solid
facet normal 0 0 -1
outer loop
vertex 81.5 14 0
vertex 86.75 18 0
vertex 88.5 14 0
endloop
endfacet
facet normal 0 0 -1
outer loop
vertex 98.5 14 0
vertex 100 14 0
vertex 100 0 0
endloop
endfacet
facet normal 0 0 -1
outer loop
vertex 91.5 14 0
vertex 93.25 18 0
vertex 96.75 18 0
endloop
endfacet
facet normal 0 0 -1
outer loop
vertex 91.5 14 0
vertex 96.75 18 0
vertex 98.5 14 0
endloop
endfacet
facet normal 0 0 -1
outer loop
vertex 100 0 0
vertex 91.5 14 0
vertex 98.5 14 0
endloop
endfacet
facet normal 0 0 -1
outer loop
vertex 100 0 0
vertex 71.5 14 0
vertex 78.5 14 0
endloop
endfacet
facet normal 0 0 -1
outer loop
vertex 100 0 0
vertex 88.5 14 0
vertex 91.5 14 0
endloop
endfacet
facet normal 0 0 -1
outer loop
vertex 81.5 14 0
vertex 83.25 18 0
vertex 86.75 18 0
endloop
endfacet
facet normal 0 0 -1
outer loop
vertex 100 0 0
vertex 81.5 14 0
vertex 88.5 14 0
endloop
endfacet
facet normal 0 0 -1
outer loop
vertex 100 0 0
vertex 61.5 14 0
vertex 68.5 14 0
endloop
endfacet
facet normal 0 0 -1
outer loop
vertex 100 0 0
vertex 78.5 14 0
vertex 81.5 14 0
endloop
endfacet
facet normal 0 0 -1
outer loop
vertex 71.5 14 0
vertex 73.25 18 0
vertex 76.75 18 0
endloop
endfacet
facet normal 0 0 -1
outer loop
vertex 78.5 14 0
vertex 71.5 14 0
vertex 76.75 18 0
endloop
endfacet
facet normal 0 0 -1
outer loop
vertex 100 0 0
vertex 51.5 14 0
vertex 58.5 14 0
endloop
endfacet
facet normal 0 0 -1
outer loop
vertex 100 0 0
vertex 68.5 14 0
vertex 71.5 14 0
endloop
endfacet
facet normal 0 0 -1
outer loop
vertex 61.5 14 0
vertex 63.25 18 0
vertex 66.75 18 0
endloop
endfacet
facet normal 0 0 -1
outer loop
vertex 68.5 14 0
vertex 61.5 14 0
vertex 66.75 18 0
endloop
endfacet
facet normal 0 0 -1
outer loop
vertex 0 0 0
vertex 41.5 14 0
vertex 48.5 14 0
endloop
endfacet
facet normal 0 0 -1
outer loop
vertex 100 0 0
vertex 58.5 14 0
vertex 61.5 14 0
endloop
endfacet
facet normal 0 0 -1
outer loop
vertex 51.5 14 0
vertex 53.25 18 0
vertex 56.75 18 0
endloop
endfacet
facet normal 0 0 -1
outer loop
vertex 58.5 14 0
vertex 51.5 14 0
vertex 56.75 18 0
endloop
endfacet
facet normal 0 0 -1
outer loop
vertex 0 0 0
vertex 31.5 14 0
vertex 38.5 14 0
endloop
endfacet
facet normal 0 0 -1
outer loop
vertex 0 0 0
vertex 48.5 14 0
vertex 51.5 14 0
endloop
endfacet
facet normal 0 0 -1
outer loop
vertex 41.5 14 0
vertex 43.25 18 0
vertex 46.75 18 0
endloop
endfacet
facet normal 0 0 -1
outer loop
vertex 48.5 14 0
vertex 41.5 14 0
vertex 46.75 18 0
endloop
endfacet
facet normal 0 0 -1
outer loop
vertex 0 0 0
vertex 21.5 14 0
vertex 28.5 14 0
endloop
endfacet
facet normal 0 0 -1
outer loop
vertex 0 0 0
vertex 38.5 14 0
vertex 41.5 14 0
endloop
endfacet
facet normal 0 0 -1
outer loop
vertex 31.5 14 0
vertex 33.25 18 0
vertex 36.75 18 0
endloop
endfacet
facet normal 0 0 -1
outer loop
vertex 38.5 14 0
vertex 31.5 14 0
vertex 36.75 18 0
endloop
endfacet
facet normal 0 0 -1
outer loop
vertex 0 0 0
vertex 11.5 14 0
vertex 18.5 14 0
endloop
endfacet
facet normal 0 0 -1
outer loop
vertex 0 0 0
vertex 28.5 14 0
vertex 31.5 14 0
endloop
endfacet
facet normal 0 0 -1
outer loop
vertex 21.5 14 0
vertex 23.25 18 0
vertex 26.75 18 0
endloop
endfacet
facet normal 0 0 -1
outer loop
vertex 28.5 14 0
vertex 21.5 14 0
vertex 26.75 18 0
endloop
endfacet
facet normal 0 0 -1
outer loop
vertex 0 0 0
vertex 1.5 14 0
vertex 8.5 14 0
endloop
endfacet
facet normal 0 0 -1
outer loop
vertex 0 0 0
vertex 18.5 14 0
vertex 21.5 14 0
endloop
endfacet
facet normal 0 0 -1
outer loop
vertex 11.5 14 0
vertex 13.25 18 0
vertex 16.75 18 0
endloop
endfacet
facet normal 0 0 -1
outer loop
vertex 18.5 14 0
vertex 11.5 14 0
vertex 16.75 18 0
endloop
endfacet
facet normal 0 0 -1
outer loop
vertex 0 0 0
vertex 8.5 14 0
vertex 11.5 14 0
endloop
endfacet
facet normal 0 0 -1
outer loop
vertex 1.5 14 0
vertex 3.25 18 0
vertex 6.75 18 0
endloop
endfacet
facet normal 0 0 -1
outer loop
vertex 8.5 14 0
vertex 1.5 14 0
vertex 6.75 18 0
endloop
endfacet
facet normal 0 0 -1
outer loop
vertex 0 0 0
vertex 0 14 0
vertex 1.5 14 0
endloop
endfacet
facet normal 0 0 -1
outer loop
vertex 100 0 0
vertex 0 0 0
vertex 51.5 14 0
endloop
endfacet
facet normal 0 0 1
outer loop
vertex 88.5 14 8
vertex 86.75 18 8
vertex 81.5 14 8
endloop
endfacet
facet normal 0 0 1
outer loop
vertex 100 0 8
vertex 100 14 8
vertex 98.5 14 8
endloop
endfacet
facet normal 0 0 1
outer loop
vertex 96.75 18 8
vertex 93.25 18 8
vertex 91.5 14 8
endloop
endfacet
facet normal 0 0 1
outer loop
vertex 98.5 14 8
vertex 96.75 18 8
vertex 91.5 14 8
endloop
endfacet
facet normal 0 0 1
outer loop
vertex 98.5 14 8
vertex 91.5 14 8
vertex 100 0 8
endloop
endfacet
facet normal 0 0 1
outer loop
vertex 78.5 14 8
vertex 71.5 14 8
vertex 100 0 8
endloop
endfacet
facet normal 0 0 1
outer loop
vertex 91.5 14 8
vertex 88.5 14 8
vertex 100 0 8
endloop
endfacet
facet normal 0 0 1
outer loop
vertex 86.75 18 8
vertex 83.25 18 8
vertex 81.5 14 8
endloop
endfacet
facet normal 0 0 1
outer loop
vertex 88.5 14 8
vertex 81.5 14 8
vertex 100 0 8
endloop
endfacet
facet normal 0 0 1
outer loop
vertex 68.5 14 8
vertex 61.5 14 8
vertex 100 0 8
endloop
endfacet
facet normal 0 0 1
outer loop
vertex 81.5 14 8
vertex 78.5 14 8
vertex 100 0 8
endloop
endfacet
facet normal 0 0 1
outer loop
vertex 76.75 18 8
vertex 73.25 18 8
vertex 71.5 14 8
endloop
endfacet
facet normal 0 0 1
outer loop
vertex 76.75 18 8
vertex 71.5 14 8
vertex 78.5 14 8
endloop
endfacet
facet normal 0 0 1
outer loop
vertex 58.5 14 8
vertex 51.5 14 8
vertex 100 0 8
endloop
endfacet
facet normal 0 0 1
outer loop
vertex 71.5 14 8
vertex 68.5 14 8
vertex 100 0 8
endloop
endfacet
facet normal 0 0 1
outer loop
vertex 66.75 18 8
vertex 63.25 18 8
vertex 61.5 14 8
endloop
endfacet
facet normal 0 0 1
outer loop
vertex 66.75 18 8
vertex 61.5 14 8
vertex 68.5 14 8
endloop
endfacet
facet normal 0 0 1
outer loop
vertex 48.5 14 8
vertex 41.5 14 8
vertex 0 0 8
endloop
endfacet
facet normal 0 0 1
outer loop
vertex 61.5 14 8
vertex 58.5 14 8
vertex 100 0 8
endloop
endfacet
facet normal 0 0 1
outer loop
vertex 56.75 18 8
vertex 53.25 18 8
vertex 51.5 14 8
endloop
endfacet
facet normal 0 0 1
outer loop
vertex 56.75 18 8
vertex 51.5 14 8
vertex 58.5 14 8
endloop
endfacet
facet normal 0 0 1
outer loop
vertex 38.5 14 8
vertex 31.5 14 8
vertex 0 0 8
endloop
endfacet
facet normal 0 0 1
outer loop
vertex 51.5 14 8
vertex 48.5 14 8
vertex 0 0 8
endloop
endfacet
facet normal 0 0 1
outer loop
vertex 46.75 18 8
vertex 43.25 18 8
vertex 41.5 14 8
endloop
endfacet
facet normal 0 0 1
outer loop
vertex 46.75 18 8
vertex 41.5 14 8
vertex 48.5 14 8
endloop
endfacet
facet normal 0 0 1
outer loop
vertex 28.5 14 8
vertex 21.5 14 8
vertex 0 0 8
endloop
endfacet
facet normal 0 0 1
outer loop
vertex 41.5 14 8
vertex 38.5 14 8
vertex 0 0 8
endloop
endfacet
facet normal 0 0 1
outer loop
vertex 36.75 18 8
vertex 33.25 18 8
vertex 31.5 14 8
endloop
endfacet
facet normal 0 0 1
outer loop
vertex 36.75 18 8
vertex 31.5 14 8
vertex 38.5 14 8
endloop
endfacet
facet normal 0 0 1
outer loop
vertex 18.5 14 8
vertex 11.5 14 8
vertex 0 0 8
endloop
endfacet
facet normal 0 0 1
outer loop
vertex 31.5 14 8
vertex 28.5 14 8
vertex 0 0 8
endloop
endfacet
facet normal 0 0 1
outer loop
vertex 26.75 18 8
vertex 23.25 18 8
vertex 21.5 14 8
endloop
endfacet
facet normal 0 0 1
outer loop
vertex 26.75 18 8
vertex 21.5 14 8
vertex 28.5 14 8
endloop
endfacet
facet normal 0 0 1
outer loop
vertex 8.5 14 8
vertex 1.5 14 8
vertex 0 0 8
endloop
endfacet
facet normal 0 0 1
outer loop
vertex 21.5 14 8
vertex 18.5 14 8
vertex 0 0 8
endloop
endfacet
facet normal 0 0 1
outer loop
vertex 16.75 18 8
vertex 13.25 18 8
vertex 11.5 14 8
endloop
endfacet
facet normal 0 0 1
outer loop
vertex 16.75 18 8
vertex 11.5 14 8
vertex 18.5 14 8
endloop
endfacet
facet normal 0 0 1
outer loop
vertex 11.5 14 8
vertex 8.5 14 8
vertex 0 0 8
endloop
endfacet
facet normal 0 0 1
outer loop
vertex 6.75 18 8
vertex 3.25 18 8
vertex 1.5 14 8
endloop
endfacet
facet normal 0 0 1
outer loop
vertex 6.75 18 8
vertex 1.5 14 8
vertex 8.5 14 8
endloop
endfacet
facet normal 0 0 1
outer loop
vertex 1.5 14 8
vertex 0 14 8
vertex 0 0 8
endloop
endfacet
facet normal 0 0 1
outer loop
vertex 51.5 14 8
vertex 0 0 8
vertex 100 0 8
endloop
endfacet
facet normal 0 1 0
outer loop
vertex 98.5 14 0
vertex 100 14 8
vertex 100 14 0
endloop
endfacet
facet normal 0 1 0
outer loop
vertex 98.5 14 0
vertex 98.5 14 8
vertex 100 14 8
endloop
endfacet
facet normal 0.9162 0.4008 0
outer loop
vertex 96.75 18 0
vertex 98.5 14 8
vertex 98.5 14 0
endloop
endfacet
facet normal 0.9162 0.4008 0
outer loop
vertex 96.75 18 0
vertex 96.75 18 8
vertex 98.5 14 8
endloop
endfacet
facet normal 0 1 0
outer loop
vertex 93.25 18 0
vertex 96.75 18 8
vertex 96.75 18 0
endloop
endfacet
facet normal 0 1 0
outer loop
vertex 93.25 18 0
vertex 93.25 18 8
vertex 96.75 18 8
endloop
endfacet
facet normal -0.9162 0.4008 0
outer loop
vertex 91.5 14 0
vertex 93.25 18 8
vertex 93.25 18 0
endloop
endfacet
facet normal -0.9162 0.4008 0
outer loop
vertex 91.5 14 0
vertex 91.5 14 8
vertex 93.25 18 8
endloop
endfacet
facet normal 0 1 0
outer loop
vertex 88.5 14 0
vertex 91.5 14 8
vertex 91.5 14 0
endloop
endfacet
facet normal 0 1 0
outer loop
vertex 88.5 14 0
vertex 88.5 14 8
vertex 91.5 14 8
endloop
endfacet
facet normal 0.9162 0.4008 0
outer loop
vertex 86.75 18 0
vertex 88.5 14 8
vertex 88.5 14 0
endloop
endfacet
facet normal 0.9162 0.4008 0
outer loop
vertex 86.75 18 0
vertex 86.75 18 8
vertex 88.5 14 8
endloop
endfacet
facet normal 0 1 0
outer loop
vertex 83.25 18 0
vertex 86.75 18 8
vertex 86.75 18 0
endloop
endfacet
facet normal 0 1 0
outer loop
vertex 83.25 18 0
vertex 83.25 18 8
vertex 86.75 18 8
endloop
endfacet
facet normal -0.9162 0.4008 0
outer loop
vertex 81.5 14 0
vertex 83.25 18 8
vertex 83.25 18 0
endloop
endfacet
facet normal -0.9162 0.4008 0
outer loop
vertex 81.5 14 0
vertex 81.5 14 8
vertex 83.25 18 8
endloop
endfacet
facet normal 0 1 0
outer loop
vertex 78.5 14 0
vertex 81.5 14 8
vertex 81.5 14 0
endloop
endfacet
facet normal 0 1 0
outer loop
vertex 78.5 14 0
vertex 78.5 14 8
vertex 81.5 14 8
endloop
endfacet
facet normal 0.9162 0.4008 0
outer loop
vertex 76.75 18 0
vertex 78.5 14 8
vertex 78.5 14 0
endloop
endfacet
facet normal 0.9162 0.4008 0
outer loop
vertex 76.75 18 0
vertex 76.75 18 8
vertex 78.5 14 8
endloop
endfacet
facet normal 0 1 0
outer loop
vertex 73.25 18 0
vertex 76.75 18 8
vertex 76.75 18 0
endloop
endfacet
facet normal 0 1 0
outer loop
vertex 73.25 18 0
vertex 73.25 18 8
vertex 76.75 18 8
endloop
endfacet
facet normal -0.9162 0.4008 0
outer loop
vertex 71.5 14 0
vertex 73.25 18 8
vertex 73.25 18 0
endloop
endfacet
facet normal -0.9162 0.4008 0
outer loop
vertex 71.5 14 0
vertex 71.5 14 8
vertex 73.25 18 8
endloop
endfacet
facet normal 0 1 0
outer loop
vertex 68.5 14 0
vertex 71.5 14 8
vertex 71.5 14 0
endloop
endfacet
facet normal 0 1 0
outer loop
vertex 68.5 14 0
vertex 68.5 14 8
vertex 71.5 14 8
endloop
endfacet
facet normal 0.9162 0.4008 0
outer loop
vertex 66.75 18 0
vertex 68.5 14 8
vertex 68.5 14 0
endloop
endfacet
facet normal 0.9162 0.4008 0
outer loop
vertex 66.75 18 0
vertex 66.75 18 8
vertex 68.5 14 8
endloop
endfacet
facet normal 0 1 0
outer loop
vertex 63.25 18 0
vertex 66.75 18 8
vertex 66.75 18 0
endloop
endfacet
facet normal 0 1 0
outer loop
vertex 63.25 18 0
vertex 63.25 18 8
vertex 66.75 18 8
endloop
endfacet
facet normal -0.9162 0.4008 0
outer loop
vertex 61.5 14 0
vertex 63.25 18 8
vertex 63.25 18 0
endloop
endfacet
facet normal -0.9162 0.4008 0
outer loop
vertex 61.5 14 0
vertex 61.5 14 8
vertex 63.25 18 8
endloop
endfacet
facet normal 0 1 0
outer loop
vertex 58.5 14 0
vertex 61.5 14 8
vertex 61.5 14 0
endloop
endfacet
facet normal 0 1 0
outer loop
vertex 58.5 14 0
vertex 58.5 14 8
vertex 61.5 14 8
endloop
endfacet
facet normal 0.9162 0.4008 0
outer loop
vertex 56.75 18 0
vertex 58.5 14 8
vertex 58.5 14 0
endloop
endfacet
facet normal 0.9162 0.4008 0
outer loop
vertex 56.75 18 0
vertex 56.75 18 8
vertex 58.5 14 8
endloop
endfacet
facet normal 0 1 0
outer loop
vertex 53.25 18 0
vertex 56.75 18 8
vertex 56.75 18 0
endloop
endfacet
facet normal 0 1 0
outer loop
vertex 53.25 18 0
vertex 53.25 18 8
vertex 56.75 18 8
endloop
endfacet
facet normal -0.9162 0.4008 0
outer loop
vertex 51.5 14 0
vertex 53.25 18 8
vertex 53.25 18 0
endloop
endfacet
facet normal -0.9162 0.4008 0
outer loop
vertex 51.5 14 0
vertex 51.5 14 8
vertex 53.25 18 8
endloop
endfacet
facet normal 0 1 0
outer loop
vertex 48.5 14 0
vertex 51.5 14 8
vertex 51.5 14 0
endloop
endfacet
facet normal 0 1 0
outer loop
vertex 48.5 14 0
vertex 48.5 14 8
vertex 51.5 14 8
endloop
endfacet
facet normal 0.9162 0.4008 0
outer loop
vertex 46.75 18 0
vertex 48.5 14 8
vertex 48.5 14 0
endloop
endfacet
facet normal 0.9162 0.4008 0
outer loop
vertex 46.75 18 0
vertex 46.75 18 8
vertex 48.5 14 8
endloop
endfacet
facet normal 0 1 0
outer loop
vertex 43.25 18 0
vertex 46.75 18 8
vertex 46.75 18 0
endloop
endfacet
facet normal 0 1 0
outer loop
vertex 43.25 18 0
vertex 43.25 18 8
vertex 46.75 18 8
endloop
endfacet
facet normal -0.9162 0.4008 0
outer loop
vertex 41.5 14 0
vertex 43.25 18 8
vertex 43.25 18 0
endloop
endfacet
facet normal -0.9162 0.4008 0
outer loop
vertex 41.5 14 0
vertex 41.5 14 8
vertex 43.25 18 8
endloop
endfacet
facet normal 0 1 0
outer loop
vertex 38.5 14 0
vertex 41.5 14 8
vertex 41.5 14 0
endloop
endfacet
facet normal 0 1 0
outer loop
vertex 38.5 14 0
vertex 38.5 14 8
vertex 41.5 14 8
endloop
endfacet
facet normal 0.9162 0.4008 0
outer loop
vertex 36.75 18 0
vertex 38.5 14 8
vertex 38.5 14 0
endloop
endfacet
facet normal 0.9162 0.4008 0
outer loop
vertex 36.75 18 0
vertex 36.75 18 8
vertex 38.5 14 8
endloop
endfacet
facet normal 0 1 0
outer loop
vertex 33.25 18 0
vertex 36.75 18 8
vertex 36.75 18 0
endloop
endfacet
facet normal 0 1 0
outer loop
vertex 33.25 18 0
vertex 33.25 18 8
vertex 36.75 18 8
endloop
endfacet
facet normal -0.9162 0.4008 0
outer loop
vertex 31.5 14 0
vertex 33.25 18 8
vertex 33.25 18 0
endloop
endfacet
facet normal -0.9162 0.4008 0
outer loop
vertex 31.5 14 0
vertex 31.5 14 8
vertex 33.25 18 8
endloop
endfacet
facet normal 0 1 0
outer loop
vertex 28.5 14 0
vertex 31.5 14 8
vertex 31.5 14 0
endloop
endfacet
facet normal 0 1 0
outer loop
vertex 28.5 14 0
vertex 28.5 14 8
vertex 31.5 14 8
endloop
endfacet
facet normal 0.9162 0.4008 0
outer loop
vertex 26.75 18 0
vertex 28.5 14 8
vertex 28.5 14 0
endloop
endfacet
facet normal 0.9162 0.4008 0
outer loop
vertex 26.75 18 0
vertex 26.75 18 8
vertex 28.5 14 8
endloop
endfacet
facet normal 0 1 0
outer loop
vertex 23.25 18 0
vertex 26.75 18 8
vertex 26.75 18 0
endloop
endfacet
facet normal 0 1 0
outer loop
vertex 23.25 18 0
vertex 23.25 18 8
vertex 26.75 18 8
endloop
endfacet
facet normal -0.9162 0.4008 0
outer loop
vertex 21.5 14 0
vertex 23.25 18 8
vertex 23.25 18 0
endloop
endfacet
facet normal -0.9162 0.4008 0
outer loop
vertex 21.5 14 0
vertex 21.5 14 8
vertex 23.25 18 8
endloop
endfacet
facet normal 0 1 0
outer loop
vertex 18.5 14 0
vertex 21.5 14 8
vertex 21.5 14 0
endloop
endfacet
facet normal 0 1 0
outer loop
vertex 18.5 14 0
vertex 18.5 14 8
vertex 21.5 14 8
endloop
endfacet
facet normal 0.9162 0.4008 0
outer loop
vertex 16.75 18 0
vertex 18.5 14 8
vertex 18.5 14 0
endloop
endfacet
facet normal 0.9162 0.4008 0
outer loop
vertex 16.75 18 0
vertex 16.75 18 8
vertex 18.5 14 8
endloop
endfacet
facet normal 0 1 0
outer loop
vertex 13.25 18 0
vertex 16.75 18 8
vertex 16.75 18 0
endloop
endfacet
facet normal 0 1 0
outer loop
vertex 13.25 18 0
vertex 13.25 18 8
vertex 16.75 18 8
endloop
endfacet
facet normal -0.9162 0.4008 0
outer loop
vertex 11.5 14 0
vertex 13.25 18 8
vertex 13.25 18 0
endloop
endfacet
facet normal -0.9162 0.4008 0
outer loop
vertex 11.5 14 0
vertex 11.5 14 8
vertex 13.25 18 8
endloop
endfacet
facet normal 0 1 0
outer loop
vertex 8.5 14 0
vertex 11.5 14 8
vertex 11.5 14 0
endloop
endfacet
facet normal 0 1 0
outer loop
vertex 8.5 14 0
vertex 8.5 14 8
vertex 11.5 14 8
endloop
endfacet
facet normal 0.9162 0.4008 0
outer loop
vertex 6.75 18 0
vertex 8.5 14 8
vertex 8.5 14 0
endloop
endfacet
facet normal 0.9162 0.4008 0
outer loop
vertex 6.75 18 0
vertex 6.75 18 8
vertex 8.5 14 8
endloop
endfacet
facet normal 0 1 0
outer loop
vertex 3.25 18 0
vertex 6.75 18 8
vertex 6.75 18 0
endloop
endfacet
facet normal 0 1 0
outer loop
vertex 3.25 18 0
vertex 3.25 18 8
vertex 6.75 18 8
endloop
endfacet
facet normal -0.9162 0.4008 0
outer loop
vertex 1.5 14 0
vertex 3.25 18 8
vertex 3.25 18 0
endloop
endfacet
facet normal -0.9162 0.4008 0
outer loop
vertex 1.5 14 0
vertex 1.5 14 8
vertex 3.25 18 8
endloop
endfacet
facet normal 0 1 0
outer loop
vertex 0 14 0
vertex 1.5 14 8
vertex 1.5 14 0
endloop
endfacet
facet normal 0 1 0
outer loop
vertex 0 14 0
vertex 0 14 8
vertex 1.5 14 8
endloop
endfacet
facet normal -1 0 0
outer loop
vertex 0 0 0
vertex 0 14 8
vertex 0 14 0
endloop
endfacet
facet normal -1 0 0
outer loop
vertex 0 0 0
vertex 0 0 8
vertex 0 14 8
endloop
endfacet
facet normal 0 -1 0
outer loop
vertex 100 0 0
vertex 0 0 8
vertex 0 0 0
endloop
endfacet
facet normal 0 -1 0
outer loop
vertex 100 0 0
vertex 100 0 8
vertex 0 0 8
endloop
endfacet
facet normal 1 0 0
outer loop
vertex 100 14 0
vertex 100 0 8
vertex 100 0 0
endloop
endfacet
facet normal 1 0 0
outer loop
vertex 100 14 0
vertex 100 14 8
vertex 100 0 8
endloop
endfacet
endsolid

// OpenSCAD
$fn = 32;

// ----------------------------------------------------------------------
// Gear rack: 10 teeth, pitch 10 mm
// ----------------------------------------------------------------------

// --- parameters (mm) ---
teeth = 10;               // number of teeth
pitch = 10;               // tooth pitch, X
root_w = 7;               // tooth width at the root
tip_w = 3.5;              // tooth width at the tip
base_h = 14;              // rack body height, Y
tooth_h = 4;              // tooth height above the body
plate_t = 8;              // rack width, Z (extrusion height)

rack_l = teeth * pitch;  // overall length
total_h = base_h + tooth_h;  // overall height

profile = [[0, 0], [100, 0], [100, 14], [98.5, 14], [96.75, 18], [93.25, 18], [91.5, 14], [88.5, 14], [86.75, 18], [83.25, 18], [81.5, 14], [78.5, 14], [76.75, 18], [73.25, 18], [71.5, 14], [68.5, 14], [66.75, 18], [63.25, 18], [61.5, 14], [58.5, 14], [56.75, 18], [53.25, 18], [51.5, 14], [48.5, 14], [46.75, 18], [43.25, 18], [41.5, 14], [38.5, 14], [36.75, 18], [33.25, 18], [31.5, 14], [28.5, 14], [26.75, 18], [23.25, 18], [21.5, 14], [18.5, 14], [16.75, 18], [13.25, 18], [11.5, 14], [8.5, 14], [6.75, 18], [3.25, 18], [1.5, 14], [0, 14]];  // primary outline, 44 points, counter clockwise

// --- the one profile operation ---
linear_extrude(height = plate_t) polygon(points = profile);
